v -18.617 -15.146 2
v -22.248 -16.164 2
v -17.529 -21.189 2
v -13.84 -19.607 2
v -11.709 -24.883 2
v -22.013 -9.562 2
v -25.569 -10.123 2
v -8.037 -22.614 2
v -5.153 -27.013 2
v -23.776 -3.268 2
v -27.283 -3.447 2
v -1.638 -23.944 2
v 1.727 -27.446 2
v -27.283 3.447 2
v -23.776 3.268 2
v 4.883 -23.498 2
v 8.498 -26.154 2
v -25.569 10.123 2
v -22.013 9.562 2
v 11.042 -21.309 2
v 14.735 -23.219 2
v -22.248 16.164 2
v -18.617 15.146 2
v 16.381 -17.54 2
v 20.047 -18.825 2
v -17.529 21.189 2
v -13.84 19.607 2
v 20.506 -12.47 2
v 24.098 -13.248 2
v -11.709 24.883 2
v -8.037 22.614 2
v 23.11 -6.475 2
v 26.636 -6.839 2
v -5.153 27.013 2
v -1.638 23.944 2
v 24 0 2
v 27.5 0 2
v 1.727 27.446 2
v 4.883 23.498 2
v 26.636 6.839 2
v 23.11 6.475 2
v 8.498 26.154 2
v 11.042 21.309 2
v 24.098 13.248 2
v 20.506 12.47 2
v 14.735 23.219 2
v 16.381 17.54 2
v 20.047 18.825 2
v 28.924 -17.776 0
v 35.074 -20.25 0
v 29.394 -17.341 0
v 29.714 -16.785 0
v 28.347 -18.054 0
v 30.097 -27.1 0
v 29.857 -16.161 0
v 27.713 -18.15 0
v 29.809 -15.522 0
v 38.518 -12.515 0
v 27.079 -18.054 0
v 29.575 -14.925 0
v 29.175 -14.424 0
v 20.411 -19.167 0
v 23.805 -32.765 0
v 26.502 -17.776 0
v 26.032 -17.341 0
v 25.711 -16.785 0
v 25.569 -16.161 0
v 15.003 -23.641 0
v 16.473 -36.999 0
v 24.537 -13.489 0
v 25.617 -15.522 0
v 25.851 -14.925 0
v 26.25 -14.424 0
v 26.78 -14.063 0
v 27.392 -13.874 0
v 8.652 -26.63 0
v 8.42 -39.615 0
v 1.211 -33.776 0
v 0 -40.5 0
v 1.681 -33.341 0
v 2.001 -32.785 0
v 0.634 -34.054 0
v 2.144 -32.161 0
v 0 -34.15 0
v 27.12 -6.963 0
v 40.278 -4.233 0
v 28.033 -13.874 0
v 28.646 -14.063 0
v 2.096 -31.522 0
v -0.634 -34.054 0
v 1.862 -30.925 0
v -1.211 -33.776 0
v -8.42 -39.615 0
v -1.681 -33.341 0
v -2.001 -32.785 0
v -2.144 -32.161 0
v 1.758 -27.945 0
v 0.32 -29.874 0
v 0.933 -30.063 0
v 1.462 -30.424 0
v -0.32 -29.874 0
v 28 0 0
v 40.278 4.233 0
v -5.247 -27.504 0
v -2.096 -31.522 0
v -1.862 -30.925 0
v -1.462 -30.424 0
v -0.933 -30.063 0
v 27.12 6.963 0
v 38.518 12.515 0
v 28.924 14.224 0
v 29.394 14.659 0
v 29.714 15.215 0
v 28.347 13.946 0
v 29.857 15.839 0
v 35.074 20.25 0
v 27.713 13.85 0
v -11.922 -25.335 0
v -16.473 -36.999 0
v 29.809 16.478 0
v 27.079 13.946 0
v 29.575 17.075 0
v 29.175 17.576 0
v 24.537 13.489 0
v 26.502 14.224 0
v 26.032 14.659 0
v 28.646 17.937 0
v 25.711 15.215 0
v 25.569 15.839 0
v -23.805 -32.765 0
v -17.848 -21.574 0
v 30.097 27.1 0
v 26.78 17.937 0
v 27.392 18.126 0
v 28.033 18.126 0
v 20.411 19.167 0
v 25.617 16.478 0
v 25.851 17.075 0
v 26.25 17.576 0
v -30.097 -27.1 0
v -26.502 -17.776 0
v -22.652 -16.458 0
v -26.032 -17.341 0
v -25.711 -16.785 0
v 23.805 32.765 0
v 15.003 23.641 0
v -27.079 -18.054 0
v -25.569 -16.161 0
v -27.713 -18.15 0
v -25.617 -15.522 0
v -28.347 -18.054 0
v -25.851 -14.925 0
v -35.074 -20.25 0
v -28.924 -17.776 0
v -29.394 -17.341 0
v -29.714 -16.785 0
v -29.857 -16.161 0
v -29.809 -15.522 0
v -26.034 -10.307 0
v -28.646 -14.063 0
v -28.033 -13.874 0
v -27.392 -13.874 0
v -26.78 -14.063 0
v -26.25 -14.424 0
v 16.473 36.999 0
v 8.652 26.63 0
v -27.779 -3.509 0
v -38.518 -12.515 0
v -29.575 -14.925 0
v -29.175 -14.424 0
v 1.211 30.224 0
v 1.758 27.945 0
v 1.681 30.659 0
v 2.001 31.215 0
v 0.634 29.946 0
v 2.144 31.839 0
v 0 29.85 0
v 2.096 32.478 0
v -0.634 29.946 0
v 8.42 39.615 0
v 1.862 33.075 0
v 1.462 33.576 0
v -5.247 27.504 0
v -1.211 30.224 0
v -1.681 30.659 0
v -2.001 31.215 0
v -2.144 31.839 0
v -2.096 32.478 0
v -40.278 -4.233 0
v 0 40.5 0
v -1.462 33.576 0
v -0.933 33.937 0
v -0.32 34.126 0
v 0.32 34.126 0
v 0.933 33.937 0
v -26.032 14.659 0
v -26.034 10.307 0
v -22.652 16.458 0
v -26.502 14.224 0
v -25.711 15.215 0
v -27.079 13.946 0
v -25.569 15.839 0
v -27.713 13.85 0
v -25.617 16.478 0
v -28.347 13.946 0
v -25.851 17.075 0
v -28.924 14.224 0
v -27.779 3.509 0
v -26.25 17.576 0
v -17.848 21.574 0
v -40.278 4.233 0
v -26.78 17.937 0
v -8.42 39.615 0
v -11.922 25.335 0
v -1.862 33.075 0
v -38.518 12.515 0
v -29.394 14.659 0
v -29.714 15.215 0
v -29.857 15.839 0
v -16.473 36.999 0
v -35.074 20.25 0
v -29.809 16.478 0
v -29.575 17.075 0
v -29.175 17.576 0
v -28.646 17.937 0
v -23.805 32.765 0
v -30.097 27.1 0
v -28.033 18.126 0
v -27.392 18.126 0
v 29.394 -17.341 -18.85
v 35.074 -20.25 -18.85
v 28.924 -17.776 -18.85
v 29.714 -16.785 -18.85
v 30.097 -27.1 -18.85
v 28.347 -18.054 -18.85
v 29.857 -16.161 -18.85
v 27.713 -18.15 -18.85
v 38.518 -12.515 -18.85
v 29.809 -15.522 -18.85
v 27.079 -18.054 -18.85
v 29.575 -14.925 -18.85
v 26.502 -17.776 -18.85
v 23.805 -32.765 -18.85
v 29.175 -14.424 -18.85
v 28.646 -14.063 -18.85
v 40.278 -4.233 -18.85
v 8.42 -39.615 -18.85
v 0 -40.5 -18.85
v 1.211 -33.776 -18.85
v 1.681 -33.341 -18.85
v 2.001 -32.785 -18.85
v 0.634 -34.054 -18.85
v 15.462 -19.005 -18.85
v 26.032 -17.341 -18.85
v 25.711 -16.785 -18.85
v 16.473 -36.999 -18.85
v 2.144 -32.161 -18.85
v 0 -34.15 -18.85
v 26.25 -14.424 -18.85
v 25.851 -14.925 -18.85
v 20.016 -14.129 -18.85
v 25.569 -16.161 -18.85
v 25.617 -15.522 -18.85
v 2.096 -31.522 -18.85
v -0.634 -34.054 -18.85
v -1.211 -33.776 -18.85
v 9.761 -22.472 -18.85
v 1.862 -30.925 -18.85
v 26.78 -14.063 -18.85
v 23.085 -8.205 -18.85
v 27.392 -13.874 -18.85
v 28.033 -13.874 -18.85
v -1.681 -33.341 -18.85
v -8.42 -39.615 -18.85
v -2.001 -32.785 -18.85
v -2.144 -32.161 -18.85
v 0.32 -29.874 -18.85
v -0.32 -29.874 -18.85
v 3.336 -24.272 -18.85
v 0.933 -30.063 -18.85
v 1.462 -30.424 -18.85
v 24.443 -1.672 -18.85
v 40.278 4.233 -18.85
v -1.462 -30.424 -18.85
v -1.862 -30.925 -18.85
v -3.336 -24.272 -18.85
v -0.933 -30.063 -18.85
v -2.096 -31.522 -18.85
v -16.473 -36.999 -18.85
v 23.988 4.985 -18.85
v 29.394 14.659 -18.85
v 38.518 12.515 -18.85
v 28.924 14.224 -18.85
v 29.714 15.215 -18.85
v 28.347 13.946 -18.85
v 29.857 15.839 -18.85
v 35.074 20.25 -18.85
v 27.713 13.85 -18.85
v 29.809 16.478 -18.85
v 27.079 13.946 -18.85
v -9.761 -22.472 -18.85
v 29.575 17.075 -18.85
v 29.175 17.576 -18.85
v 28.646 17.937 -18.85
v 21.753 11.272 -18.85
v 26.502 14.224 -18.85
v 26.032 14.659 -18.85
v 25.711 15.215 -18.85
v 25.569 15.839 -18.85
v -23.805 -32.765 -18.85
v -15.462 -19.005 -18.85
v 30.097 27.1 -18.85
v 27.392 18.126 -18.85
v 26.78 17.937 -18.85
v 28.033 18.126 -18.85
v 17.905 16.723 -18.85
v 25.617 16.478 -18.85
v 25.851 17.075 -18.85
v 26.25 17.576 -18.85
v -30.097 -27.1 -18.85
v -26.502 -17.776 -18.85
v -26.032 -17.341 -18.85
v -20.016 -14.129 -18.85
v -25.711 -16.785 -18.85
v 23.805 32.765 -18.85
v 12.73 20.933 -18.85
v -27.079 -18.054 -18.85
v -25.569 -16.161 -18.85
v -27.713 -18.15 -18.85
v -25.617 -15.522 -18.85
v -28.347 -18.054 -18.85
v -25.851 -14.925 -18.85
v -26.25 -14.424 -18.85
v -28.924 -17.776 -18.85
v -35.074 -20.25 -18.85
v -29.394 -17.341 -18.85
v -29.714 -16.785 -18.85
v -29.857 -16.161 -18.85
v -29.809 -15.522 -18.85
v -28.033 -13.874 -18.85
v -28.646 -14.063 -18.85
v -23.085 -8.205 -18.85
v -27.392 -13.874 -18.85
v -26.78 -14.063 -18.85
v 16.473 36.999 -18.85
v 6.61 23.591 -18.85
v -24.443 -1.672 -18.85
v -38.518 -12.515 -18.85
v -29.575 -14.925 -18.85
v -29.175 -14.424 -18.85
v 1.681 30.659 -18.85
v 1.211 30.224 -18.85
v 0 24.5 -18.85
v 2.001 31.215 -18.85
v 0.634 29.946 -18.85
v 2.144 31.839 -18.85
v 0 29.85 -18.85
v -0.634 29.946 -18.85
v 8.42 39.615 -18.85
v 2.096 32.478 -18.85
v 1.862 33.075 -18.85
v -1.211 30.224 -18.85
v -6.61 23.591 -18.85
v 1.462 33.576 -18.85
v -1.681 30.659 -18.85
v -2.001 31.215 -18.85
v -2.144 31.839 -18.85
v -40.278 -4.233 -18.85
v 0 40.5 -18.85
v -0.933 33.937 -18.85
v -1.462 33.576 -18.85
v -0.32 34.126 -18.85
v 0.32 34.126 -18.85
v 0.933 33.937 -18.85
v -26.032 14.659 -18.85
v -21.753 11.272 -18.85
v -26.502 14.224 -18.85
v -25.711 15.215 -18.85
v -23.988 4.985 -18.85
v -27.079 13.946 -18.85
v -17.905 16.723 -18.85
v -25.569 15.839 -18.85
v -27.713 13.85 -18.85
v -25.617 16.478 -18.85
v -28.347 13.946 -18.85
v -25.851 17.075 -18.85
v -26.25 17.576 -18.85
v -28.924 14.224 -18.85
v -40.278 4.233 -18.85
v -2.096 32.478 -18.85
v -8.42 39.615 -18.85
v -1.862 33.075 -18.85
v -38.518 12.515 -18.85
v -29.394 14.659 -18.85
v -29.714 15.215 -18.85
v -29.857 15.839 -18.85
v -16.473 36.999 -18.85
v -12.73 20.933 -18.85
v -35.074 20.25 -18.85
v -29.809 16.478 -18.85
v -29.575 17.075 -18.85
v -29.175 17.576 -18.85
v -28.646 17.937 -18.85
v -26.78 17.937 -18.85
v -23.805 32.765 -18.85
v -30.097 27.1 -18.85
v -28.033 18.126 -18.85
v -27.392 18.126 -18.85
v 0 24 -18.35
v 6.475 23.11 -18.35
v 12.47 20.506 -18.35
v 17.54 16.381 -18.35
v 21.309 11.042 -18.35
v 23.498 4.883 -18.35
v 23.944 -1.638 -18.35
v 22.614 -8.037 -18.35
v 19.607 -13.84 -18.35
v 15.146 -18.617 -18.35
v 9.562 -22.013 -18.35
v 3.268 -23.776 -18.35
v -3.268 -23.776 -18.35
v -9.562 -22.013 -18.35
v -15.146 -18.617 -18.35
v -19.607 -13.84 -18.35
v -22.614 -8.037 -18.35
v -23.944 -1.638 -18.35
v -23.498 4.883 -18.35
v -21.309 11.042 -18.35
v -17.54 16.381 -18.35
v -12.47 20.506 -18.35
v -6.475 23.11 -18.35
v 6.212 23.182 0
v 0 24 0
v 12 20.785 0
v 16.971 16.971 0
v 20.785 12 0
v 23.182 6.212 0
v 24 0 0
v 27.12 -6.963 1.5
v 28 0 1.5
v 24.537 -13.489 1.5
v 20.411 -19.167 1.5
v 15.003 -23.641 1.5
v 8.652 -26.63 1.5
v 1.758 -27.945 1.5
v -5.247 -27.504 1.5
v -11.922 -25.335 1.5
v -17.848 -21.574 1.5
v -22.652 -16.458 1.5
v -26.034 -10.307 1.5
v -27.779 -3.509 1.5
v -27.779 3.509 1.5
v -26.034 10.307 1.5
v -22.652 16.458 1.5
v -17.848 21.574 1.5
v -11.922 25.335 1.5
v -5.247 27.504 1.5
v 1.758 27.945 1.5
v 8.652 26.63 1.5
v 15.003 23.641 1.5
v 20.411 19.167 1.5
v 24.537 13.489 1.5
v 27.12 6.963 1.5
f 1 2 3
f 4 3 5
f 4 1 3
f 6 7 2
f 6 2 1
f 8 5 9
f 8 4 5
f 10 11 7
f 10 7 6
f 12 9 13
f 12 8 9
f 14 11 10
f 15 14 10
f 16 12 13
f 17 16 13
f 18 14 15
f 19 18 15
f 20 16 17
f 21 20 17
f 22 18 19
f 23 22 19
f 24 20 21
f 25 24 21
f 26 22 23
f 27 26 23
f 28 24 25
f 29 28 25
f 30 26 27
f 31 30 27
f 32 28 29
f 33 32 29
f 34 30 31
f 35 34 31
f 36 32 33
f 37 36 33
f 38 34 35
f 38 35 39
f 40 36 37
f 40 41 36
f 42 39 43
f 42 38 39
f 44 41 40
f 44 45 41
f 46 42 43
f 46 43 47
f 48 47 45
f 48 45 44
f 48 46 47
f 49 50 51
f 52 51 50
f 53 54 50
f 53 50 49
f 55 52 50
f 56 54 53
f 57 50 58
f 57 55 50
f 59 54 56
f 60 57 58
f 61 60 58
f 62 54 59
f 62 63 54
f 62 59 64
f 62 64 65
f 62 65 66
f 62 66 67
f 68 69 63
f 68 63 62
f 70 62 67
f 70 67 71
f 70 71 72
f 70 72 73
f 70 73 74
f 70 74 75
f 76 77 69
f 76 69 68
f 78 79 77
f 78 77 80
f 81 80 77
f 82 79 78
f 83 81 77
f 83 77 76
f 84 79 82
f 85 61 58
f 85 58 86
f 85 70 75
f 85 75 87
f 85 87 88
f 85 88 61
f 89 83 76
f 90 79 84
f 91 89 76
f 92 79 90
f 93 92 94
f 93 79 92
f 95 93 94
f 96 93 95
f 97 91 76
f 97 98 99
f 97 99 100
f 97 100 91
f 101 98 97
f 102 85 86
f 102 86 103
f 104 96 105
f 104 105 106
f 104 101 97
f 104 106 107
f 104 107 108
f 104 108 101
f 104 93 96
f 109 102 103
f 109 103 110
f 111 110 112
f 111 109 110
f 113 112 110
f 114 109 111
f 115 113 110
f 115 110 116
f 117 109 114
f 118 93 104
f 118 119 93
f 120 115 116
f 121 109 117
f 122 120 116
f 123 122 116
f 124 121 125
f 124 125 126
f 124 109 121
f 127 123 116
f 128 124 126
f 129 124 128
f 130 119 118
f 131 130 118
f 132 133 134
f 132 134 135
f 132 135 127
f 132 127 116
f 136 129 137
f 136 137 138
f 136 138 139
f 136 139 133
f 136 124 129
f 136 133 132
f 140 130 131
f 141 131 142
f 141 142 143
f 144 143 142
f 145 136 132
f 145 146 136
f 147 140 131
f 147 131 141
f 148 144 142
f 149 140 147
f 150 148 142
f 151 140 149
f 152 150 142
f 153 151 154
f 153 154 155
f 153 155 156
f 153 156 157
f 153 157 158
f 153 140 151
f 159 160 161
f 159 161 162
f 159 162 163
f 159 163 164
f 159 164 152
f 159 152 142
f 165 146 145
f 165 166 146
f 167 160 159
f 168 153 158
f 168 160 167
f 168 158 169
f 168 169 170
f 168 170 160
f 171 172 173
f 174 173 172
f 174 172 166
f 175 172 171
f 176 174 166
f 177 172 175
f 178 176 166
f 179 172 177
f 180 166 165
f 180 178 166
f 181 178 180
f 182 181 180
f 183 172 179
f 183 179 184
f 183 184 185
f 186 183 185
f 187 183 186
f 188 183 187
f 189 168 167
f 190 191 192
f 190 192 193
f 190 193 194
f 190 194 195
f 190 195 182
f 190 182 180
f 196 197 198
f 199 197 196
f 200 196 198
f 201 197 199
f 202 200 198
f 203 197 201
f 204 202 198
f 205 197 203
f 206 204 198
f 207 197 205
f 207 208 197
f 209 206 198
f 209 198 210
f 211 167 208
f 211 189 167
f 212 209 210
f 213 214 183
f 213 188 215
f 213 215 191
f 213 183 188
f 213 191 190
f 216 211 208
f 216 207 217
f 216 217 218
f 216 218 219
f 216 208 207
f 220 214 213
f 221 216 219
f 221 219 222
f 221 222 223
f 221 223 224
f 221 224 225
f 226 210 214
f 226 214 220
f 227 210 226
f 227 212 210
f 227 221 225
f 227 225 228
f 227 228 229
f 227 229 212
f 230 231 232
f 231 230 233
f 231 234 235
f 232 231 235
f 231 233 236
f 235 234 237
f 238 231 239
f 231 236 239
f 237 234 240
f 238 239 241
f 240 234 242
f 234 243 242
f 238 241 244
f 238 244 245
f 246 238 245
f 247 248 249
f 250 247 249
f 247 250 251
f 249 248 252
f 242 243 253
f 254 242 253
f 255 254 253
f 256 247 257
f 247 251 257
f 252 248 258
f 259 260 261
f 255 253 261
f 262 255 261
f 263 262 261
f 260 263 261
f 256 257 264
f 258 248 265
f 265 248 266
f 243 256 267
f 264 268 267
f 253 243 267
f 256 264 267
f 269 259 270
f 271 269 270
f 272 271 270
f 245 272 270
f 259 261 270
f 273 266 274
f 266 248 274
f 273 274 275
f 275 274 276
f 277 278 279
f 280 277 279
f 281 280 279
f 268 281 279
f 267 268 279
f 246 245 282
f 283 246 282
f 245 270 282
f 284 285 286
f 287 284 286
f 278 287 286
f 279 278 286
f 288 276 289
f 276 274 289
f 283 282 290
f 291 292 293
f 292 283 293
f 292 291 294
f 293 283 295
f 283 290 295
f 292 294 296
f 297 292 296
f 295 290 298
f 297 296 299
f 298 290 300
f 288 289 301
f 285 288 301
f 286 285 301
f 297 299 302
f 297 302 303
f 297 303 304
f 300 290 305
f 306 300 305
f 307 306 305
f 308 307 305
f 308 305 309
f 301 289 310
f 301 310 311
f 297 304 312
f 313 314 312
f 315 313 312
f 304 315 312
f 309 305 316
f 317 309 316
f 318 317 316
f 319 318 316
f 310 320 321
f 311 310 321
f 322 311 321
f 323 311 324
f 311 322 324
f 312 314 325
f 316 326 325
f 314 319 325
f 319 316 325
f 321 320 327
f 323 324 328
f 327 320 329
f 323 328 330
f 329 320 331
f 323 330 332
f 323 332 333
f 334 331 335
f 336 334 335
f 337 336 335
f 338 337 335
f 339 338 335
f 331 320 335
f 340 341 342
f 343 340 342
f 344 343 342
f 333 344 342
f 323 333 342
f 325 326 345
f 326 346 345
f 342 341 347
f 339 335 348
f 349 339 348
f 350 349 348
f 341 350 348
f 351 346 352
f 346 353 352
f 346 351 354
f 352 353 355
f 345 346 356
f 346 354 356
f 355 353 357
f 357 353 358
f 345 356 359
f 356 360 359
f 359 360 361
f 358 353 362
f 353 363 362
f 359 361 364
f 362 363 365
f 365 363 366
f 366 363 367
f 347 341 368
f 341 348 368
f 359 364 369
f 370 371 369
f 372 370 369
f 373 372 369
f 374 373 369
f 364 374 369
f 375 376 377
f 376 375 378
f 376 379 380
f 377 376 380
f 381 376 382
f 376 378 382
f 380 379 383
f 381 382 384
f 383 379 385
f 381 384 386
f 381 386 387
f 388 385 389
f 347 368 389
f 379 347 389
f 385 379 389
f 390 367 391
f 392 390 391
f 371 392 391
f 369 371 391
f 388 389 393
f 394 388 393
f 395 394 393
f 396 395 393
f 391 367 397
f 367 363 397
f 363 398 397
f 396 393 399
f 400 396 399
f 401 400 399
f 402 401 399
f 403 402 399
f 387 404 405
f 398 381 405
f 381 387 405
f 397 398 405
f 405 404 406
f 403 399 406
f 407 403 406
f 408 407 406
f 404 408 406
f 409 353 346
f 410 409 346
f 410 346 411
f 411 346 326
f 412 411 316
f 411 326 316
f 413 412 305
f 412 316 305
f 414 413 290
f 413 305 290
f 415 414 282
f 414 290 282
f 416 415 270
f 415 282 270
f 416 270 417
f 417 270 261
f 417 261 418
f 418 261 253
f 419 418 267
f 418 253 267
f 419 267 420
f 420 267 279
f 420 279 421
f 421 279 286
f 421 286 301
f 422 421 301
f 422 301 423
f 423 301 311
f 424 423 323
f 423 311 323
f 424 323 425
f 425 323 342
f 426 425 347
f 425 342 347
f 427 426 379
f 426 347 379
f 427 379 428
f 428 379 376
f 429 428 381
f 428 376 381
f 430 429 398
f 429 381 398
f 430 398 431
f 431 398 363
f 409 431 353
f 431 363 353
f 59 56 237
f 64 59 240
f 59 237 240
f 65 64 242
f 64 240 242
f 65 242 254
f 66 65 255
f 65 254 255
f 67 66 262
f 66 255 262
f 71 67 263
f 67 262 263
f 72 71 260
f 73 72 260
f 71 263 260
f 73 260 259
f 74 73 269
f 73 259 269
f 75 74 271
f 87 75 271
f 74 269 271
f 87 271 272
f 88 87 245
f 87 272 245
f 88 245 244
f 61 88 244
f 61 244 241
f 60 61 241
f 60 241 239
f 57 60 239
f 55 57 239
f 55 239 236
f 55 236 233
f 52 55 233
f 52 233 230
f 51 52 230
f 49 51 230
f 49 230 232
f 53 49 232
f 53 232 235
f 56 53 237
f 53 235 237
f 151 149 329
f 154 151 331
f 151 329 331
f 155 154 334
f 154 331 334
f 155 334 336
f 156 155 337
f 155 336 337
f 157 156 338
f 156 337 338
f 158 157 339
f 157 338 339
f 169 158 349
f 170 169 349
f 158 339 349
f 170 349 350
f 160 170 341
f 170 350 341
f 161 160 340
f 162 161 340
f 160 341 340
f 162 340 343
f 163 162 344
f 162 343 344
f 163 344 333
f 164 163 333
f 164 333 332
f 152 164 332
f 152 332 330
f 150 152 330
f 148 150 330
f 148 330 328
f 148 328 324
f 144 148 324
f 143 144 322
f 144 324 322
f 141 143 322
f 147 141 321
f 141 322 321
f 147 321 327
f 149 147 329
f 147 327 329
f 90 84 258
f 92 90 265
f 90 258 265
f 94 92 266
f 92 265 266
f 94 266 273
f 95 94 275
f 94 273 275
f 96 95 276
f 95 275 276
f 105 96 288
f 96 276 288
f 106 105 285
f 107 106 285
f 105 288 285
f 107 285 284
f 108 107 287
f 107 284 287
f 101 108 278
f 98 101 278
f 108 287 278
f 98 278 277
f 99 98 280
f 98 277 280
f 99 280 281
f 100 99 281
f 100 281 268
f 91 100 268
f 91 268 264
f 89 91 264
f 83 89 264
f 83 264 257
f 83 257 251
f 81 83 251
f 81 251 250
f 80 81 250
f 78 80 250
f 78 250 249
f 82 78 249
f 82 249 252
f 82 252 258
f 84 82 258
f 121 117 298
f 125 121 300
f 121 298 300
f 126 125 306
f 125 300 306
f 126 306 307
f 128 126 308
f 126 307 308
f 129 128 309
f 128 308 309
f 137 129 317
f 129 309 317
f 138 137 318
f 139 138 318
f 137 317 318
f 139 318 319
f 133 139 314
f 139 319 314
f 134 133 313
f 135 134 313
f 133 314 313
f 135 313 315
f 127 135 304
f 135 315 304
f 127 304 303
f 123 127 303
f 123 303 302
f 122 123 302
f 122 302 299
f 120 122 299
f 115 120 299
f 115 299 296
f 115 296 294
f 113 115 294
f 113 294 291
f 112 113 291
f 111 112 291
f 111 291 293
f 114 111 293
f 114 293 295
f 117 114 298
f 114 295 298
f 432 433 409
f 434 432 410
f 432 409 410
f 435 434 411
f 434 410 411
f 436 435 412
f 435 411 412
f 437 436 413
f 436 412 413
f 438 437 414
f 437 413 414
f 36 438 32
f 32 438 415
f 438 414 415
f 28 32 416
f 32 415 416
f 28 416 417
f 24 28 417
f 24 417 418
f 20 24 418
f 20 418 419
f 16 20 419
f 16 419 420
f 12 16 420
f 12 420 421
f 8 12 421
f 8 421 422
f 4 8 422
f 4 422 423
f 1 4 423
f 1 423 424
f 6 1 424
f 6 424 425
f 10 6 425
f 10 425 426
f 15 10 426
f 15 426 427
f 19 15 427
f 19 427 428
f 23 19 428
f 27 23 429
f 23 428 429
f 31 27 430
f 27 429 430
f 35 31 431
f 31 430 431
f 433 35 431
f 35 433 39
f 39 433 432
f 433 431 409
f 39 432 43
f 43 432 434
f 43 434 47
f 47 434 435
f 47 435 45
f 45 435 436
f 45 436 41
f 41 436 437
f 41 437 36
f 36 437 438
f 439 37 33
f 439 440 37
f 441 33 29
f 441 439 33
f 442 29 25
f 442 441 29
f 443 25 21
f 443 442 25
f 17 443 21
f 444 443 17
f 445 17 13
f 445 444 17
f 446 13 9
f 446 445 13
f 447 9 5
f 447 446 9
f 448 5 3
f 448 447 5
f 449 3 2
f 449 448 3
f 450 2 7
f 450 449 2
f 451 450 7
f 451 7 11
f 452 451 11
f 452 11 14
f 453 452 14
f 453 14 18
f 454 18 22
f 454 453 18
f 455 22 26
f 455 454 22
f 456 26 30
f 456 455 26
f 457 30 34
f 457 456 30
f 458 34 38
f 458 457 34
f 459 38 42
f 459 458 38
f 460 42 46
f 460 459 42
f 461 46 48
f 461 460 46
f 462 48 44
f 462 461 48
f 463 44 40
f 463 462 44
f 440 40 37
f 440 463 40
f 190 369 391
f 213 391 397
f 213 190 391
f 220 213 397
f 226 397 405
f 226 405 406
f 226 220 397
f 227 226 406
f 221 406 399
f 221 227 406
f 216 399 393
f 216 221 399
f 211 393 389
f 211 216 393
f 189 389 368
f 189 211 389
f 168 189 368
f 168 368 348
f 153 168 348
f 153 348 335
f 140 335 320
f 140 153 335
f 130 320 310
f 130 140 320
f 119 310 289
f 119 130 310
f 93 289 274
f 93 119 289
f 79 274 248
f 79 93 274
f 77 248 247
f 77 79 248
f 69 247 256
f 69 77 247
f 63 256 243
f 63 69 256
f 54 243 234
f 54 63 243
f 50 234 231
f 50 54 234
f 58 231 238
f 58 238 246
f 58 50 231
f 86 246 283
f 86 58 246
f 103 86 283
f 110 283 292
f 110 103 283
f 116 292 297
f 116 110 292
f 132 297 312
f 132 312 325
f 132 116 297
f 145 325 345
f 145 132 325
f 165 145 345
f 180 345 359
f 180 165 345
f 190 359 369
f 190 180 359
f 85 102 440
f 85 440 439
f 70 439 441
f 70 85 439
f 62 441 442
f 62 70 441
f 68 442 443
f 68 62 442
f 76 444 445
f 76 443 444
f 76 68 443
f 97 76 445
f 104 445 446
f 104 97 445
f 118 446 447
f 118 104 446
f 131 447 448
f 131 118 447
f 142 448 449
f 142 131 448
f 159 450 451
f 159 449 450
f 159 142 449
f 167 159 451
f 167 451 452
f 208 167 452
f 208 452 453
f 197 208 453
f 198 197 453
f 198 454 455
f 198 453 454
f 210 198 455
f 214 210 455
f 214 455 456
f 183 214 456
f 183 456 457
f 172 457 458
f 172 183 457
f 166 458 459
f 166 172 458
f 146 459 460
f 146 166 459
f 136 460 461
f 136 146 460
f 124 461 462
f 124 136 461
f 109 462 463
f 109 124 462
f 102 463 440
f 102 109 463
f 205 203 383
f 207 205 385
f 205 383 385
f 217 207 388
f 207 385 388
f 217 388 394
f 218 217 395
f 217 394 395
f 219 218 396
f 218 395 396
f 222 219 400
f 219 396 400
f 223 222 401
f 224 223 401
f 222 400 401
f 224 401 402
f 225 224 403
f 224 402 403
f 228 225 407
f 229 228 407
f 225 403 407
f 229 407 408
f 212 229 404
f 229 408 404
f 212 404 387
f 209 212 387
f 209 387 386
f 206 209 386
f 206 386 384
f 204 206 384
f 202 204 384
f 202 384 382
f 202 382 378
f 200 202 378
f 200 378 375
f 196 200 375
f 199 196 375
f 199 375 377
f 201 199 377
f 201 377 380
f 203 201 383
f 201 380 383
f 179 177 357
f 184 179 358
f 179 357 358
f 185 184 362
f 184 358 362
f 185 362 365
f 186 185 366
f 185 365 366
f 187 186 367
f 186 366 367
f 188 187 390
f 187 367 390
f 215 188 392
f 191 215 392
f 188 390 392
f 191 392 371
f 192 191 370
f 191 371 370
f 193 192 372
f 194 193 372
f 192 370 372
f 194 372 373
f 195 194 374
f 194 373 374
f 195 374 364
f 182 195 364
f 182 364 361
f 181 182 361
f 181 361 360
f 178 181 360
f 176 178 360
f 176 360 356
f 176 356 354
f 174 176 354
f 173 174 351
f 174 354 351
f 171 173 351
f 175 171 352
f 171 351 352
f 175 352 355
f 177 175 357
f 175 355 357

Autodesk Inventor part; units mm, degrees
ref_plane "YZ Plane" through (0, 0, 0) normal (1, 0, 0) x (0, 1, 0)
ref_plane "XZ Plane" through (0, 0, 0) normal (0, 1, 0) x (-1, 0, 0)
ref_plane "XY Plane" through (0, 0, 0) normal (0, 0, 1) x (1, 0, 0)
sketch "スケッチ1" plane through (0, 0, 0) normal (1, 0, 0) x (0, 1, 0)
  line L0 (40.5, 0) -> (24, 0)
  line L1 (24, 0) -> (24, -18.85)
  line L2 (24, -18.85) -> (40.5, -18.85)
  line L3 (40.5, -18.85) -> (40.5, 0)
  line L4 (0, -22.62) -> (0, 3.77) projected
  point P0 (0, 0)
  dimension "d0" = 24
  dimension "d2" = 40.5
  dimension "d3" = 18.85
revolve "回転1" add sketch "スケッチ1" angle 360 about axis through (0, 0, -10) along (0, 0, 1)
sketch "スケッチ2" plane through (0, 0, 0) normal (0, 0, 1) x (1, 0, 0)
  circle A0 centre (0, 0) radius 32
  point P0 (0, 32)
  point P1 (-27.7128, 16)
  point P2 (-27.7128, -16)
  point P3 (0, -32)
  point P4 (27.7128, -16)
  point P5 (27.7128, 16)
  dimension "d5" = 64
  dimension "d8" = 360
hole "穴1" at (0, 32, 0) at (-27.7128, 16, 0) at (-27.7128, -16, 0) at (0, -32, 0) at (27.7128, -16, 0) at (27.7128, 16, 0) direction (0, 0, -1) diameter 4.3 end through all clearance for "Socket Head Cap Screw" size "M4" standard "Ansi Metric M Profile"
sketch "スケッチ5" plane through (0, 0, 0) normal (0, 0, 1) x (1, 0, 0)
  circle A0 centre (0, 0) radius 24 projected
  circle A1 centre (0, 0) radius 28
  dimension "d28" = 4
extrude "押し出し3" add sketch "スケッチ5" along normal blind 2
chamfer "面取り1" distance 0.5 angle 45 1 edges at (-28, 0, 2)
chamfer "面取り2" distance 0.5 angle 45 1 edges at (0, -24, -18.85)
properties part number "unit-base7" material "ABS プラスチック"
